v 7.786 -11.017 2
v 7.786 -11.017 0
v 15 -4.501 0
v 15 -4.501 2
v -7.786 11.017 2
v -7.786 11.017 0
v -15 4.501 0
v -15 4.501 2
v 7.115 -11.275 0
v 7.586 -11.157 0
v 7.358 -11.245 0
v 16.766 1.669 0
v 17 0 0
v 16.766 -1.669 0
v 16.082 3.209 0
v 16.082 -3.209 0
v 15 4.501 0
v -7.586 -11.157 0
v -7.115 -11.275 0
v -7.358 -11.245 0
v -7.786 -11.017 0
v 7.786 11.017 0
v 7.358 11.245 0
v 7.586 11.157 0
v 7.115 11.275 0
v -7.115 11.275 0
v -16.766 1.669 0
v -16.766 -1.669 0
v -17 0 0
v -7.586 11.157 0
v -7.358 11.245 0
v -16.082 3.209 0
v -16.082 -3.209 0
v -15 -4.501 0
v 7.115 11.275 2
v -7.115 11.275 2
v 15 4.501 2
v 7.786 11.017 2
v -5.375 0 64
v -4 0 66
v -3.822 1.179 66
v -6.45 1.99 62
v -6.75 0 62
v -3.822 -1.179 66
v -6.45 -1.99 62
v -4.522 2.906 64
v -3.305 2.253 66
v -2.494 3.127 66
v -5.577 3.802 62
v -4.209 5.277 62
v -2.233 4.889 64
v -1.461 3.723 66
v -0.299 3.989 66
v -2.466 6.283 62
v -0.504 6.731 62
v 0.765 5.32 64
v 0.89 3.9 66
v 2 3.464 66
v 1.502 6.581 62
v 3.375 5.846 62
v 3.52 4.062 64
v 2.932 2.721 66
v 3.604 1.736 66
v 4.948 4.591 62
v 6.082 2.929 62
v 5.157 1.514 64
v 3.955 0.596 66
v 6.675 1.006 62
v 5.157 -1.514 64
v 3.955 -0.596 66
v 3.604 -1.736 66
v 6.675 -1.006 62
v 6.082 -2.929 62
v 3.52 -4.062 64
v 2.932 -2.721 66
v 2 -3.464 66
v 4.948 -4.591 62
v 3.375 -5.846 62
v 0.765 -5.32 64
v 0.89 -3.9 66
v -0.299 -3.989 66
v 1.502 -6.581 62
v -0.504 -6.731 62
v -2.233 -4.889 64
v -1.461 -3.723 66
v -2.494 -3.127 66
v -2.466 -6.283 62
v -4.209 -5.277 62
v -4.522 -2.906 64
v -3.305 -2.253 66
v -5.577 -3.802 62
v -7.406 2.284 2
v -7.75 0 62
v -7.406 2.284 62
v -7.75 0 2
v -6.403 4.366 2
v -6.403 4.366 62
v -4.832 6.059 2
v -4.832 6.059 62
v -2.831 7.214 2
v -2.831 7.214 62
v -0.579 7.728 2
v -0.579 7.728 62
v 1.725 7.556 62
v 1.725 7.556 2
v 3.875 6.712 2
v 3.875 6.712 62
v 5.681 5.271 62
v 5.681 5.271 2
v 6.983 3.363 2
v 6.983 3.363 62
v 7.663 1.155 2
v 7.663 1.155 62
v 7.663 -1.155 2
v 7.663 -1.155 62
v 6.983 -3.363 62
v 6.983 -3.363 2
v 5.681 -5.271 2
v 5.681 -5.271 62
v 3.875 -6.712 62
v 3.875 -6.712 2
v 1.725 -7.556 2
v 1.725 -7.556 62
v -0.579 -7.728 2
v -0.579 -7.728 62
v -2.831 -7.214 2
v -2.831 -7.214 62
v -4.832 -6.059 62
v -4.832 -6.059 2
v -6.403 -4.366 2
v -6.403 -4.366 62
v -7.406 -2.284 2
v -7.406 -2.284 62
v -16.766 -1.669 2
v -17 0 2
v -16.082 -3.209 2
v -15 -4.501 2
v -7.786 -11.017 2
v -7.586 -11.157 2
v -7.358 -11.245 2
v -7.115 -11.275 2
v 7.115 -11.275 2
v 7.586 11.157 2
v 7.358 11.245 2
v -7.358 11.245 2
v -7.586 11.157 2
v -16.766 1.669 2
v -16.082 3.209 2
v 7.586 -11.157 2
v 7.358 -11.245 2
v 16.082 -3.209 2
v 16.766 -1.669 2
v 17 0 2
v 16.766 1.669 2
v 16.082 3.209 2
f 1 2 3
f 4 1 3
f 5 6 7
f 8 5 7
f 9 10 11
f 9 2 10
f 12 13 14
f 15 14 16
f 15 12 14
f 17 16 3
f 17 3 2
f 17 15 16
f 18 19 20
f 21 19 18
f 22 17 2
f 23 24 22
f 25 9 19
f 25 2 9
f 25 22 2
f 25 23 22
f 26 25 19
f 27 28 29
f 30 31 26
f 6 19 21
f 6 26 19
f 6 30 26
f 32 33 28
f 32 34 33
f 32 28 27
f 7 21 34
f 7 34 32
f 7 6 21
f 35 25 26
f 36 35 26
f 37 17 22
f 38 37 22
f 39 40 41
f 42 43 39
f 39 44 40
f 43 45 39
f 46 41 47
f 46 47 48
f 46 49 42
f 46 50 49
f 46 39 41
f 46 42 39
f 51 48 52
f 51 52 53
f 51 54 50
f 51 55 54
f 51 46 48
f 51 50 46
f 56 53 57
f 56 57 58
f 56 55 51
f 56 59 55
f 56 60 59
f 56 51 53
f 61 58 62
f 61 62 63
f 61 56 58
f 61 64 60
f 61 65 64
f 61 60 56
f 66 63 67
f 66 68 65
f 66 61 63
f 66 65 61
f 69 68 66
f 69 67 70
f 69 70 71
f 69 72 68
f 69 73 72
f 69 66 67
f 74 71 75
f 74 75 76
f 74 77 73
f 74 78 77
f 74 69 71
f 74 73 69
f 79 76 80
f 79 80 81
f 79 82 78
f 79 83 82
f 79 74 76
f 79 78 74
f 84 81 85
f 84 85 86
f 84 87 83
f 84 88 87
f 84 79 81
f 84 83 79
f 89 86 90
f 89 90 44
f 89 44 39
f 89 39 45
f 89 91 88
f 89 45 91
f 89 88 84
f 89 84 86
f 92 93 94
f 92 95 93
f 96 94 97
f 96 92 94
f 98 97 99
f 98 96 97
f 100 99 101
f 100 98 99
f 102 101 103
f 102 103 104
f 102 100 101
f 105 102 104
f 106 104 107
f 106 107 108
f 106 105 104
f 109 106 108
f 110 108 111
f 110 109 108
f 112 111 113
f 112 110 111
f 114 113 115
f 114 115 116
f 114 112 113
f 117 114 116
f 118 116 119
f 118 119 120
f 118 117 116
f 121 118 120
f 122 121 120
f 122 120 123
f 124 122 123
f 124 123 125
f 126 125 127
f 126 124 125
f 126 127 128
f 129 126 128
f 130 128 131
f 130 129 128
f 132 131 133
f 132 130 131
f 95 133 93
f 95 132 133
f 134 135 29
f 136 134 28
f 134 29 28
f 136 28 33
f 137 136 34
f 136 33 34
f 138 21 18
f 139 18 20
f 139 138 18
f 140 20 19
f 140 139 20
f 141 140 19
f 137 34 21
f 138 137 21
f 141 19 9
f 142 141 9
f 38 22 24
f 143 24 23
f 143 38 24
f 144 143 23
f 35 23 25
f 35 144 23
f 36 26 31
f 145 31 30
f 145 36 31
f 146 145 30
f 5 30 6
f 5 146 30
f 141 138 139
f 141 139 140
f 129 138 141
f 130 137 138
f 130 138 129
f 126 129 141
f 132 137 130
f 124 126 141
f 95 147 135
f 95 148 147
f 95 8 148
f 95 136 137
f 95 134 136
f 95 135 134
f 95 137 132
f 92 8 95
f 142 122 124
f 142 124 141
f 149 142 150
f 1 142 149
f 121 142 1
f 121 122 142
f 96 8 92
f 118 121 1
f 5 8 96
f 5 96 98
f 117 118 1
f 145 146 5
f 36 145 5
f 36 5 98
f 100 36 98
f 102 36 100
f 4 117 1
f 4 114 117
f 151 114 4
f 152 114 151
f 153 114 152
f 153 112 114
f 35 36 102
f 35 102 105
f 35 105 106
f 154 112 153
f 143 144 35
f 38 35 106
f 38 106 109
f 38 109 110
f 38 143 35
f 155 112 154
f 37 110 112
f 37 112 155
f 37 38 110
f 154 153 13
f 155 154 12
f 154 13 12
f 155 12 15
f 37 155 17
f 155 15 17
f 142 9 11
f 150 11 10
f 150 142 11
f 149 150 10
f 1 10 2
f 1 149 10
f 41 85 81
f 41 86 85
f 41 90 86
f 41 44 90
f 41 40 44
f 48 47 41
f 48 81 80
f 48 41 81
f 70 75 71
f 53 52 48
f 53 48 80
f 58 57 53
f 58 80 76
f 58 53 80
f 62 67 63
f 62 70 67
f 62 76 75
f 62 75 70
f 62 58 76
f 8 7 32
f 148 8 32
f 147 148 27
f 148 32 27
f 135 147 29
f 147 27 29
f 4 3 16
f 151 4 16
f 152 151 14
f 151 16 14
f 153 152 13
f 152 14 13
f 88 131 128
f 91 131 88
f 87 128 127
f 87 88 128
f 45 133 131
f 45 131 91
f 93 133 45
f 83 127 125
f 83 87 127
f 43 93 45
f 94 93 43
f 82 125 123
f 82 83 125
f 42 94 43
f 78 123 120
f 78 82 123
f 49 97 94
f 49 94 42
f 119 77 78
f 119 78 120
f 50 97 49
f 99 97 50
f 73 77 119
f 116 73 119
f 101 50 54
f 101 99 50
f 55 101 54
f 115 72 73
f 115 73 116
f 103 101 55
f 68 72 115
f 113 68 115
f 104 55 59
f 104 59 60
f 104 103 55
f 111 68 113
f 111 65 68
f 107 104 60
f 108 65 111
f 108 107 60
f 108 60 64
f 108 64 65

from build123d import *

# Parameters (mm, degrees)
F3_DEPTH = 66.001
F4_R     = 1


with BuildPart() as f1:
    # F0 (on Front) → F1 (revolve)
    with BuildSketch(Plane.XZ):
        Polygon((-17, 0), (0, 0), (0, 66), (-4, 66), (-6.75, 62), (-7.75, 62), (-7.75, 2), (-17, 2), align=None)
    revolve(axis=Axis((0, 0, 33), (0, 0, -1)))

    # F2 (on face) → F3 (cut, through all)
    with BuildSketch(Plane(origin=(0, 0, 0), x_dir=(1, 0, 0), z_dir=(0, 0, -1))):
        with BuildLine():
            Line((-7.5, 11.275), (7.5, 11.275))
            Line((7.5, 11.275), (15, 4.501284))
            ThreePointArc((15, 4.501284), (16.477494, 2.462801), (17, 0))
            ThreePointArc((17, 0), (0, 17), (-17, 0))
            ThreePointArc((-17, 0), (-16.477494, 2.462801), (-15, 4.501284))
            Line((-15, 4.501284), (-7.5, 11.275))
        make_face()
        with BuildLine():
            ThreePointArc((-17, 0), (0, -17), (17, 0))
            ThreePointArc((17, 0), (16.477494, -2.462801), (15, -4.501284))
            Line((15, -4.501284), (7.5, -11.275))
            Line((7.5, -11.275), (-7.5, -11.275))
            Line((-7.5, -11.275), (-15, -4.501284))
            ThreePointArc((-15, -4.501284), (-16.477494, -2.462801), (-17, 0))
        make_face()
    extrude(amount=-F3_DEPTH, mode=Mode.SUBTRACT)

    # F4
    f4_edges = [f1.edges().sort_by_distance(p)[0] for p in [
        (-7.5, -11.275, 1),
        (7.5, -11.275, 1),
        (-7.5, 11.275, 1),
        (7.5, 11.275, 1),
    ]]
    fillet(f4_edges, radius=F4_R)


solid = f1.part
